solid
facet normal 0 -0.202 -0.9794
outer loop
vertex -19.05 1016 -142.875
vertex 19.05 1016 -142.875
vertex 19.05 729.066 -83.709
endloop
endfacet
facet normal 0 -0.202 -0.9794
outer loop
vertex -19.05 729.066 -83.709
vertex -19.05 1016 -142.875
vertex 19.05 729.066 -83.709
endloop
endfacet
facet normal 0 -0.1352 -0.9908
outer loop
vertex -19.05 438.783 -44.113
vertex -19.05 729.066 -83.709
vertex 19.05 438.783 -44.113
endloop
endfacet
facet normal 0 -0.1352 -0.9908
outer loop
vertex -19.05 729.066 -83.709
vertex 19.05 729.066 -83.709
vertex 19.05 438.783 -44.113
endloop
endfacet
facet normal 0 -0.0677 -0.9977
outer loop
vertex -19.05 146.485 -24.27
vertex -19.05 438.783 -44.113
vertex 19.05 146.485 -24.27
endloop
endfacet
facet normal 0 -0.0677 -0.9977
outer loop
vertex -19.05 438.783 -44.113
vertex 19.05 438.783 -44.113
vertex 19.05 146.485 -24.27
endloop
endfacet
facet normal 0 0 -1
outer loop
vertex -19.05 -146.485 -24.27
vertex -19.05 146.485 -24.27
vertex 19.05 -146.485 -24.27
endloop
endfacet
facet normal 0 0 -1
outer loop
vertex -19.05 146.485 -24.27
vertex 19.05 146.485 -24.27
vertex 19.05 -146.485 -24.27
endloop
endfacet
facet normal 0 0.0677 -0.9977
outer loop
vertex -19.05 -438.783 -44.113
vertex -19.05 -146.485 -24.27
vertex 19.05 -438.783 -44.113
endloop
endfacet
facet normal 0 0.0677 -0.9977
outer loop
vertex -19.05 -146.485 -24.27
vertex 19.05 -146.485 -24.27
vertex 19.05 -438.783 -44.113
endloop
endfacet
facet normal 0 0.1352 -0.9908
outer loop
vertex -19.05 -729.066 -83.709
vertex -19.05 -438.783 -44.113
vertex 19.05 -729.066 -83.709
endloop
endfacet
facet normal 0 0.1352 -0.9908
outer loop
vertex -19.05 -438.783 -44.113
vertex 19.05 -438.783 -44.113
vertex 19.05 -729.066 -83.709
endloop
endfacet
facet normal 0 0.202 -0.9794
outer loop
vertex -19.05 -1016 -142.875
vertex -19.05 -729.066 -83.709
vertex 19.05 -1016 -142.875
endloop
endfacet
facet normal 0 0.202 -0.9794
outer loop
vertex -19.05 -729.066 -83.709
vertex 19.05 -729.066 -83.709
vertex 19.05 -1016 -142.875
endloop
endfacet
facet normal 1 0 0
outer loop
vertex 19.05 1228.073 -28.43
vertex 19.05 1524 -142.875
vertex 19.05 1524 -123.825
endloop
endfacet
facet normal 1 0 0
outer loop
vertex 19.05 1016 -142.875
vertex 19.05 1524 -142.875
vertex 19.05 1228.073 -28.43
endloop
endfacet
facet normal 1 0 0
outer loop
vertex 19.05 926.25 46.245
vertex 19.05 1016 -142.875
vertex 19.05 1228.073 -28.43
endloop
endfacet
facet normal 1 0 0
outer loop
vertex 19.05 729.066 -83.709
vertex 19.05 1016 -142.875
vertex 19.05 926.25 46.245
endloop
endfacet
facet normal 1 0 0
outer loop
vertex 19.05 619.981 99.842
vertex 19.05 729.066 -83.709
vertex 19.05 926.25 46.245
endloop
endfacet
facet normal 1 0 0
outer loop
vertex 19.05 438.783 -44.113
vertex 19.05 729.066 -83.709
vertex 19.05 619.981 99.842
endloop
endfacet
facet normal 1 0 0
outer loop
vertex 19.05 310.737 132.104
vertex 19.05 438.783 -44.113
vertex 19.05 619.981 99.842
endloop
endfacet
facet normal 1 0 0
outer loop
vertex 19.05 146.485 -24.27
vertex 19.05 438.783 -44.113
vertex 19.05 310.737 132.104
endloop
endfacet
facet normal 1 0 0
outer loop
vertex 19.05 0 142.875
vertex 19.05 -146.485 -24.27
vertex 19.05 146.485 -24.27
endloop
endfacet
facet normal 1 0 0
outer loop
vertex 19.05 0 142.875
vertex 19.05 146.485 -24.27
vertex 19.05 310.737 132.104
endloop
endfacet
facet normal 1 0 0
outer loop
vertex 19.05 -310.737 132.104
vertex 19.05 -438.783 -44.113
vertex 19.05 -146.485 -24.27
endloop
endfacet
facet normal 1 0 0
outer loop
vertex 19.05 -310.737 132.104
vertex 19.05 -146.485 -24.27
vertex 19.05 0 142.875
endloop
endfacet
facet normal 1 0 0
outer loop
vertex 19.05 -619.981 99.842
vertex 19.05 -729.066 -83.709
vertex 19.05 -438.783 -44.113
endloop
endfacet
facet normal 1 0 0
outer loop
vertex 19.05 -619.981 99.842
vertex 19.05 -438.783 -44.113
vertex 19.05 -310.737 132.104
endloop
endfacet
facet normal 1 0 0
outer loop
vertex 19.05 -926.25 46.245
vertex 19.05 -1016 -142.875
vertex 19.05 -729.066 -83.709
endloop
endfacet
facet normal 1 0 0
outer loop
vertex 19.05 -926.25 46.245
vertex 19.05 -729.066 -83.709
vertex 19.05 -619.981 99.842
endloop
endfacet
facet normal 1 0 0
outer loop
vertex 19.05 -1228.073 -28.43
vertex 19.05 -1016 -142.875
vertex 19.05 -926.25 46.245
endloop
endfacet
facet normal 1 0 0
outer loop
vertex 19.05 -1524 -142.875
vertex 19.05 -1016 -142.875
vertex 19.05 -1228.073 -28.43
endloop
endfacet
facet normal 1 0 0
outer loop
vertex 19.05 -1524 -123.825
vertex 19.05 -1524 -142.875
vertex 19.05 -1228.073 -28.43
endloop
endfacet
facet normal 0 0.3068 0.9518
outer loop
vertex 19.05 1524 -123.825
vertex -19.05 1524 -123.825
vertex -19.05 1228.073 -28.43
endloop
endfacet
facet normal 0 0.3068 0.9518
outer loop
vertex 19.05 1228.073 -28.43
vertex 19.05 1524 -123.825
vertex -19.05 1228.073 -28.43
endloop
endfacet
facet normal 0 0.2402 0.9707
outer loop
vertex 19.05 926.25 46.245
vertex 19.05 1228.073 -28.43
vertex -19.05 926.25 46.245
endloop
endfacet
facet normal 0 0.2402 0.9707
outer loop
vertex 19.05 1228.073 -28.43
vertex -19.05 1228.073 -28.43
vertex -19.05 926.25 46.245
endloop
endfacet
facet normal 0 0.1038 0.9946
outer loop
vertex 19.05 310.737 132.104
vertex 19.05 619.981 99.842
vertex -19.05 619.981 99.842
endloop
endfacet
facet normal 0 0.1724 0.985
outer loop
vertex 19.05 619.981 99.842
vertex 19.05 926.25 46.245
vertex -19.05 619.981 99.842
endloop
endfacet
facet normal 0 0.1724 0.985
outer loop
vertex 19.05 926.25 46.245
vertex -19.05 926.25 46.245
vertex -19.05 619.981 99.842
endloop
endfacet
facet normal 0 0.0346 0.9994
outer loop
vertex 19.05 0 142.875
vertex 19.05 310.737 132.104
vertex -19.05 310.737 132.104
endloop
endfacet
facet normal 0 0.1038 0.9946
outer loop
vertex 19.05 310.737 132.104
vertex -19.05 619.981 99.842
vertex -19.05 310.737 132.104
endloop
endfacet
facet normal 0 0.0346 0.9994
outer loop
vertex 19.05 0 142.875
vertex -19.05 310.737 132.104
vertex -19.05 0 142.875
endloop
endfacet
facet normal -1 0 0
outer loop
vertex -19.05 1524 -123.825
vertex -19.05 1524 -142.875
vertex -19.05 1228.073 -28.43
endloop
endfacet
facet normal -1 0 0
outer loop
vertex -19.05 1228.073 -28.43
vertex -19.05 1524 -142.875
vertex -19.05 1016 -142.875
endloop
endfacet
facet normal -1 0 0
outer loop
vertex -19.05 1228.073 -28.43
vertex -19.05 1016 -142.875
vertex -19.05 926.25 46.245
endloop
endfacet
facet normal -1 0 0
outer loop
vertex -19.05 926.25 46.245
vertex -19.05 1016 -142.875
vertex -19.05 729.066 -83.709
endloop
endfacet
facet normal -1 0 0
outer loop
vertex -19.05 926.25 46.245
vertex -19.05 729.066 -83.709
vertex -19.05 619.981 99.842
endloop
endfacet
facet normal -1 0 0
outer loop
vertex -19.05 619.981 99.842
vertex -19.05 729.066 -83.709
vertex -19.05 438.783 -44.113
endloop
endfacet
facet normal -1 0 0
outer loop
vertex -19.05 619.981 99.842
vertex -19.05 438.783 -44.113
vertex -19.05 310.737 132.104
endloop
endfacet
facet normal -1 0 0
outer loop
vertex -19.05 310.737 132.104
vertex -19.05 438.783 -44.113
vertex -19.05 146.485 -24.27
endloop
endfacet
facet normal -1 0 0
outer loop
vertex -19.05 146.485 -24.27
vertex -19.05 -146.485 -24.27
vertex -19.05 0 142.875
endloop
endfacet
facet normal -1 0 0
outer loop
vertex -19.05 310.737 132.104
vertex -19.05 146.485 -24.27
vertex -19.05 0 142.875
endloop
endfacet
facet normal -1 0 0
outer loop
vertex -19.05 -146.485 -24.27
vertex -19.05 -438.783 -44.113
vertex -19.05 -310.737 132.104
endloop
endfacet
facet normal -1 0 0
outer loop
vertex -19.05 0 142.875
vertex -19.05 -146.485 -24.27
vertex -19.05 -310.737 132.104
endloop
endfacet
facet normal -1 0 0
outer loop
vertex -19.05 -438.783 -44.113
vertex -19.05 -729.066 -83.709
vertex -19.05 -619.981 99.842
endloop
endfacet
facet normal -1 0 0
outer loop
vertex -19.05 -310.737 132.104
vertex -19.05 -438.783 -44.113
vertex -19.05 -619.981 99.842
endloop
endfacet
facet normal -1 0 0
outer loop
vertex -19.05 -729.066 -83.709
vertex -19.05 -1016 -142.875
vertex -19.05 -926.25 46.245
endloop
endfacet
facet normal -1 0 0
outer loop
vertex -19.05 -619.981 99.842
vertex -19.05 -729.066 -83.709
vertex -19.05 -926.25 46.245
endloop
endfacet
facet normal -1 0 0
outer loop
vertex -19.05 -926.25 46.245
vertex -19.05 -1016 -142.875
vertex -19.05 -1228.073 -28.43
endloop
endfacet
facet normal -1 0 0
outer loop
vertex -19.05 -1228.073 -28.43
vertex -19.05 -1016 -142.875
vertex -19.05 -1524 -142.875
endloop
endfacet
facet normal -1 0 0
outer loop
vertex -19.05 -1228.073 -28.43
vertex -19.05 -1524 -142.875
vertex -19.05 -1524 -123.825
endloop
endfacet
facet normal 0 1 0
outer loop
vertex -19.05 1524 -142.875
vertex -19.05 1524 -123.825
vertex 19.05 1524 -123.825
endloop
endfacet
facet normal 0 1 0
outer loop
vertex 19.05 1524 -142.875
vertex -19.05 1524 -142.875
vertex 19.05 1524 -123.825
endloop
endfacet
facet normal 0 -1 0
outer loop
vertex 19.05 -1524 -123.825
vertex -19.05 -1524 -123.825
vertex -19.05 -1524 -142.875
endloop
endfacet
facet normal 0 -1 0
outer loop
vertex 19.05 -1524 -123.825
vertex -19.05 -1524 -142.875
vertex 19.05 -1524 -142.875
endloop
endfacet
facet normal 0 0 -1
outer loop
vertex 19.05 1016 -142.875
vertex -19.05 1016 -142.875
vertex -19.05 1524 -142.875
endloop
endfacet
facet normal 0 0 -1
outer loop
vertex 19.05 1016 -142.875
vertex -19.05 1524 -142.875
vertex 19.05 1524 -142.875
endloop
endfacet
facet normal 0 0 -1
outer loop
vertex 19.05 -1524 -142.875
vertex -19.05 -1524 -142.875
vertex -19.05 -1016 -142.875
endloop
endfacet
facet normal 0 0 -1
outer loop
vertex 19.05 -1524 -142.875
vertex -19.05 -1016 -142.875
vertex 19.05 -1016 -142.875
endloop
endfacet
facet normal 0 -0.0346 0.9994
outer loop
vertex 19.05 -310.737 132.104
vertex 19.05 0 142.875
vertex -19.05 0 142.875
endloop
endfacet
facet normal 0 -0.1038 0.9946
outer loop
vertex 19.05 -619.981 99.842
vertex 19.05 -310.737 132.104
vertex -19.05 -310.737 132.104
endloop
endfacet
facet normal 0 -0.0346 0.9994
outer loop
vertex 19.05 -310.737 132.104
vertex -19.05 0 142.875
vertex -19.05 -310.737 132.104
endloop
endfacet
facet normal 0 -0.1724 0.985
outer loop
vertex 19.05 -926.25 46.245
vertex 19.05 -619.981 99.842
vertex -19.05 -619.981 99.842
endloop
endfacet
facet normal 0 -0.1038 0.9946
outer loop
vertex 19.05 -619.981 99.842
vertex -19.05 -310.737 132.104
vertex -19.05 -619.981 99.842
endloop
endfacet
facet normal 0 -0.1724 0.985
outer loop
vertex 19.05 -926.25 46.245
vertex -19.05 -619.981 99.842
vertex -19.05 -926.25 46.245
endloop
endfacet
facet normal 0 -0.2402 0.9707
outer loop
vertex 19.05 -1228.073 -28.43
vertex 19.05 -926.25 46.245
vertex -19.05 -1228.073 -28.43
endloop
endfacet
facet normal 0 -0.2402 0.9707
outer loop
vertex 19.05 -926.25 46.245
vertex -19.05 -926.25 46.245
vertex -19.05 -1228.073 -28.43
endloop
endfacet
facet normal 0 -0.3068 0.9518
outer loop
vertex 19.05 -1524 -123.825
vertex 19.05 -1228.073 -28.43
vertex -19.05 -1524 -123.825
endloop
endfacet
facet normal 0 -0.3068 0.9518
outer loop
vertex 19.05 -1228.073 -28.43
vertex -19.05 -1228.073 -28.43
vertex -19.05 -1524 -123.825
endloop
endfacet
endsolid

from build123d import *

# Parameters (mm, degrees)
F0_W     = 38.1
F0_H     = 285.75
F1_DEPTH = 1524
F3_DEPTH = 38.101
F5_DEPTH = 38.101


with BuildPart() as f1:
    # F0 (on Front) → F1 (new body, symmetric)
    with BuildSketch(Plane.XZ):
        Rectangle(F0_W, F0_H)
    extrude(amount=F1_DEPTH, both=True)

    # F2 (on face) → F3 (cut, through all)
    with BuildSketch(Plane(origin=(-19.05, 0, 0), x_dir=(0, -1, 0), z_dir=(-1, 0, 0))):
        with BuildLine():
            ThreePointArc((-1524, -123.825), (-773.580133, 75.69719), (0, 142.875))
            ThreePointArc((0, 142.875), (773.580133, 75.69719), (1524, -123.825))
            Line((1524, -123.825), (1568.751097, -123.825))
            Line((1568.751097, -123.825), (1568.751097, 303.390563))
            Line((1568.751097, 303.390563), (-1570.600986, 303.390563))
            Line((-1570.600986, 303.390563), (-1570.600986, -123.825))
            Line((-1570.600986, -123.825), (-1524, -123.825))
        make_face()
    extrude(amount=-F3_DEPTH, mode=Mode.SUBTRACT)

    # F4 (on face) → F5 (cut, through all)
    with BuildSketch(Plane.YZ.offset(19.05)):
        with BuildLine():
            Line((1016.469811, -481.722683), (1016, -142.875))
            ThreePointArc((1016, -142.875), (0, -21.787252), (-1016, -142.875))
            Line((-1016, -142.875), (-1016, -481.722683))
            Line((-1016, -481.722683), (1016.469811, -481.722683))
        make_face()
    extrude(amount=-F5_DEPTH, mode=Mode.SUBTRACT)


solid = f1.part
